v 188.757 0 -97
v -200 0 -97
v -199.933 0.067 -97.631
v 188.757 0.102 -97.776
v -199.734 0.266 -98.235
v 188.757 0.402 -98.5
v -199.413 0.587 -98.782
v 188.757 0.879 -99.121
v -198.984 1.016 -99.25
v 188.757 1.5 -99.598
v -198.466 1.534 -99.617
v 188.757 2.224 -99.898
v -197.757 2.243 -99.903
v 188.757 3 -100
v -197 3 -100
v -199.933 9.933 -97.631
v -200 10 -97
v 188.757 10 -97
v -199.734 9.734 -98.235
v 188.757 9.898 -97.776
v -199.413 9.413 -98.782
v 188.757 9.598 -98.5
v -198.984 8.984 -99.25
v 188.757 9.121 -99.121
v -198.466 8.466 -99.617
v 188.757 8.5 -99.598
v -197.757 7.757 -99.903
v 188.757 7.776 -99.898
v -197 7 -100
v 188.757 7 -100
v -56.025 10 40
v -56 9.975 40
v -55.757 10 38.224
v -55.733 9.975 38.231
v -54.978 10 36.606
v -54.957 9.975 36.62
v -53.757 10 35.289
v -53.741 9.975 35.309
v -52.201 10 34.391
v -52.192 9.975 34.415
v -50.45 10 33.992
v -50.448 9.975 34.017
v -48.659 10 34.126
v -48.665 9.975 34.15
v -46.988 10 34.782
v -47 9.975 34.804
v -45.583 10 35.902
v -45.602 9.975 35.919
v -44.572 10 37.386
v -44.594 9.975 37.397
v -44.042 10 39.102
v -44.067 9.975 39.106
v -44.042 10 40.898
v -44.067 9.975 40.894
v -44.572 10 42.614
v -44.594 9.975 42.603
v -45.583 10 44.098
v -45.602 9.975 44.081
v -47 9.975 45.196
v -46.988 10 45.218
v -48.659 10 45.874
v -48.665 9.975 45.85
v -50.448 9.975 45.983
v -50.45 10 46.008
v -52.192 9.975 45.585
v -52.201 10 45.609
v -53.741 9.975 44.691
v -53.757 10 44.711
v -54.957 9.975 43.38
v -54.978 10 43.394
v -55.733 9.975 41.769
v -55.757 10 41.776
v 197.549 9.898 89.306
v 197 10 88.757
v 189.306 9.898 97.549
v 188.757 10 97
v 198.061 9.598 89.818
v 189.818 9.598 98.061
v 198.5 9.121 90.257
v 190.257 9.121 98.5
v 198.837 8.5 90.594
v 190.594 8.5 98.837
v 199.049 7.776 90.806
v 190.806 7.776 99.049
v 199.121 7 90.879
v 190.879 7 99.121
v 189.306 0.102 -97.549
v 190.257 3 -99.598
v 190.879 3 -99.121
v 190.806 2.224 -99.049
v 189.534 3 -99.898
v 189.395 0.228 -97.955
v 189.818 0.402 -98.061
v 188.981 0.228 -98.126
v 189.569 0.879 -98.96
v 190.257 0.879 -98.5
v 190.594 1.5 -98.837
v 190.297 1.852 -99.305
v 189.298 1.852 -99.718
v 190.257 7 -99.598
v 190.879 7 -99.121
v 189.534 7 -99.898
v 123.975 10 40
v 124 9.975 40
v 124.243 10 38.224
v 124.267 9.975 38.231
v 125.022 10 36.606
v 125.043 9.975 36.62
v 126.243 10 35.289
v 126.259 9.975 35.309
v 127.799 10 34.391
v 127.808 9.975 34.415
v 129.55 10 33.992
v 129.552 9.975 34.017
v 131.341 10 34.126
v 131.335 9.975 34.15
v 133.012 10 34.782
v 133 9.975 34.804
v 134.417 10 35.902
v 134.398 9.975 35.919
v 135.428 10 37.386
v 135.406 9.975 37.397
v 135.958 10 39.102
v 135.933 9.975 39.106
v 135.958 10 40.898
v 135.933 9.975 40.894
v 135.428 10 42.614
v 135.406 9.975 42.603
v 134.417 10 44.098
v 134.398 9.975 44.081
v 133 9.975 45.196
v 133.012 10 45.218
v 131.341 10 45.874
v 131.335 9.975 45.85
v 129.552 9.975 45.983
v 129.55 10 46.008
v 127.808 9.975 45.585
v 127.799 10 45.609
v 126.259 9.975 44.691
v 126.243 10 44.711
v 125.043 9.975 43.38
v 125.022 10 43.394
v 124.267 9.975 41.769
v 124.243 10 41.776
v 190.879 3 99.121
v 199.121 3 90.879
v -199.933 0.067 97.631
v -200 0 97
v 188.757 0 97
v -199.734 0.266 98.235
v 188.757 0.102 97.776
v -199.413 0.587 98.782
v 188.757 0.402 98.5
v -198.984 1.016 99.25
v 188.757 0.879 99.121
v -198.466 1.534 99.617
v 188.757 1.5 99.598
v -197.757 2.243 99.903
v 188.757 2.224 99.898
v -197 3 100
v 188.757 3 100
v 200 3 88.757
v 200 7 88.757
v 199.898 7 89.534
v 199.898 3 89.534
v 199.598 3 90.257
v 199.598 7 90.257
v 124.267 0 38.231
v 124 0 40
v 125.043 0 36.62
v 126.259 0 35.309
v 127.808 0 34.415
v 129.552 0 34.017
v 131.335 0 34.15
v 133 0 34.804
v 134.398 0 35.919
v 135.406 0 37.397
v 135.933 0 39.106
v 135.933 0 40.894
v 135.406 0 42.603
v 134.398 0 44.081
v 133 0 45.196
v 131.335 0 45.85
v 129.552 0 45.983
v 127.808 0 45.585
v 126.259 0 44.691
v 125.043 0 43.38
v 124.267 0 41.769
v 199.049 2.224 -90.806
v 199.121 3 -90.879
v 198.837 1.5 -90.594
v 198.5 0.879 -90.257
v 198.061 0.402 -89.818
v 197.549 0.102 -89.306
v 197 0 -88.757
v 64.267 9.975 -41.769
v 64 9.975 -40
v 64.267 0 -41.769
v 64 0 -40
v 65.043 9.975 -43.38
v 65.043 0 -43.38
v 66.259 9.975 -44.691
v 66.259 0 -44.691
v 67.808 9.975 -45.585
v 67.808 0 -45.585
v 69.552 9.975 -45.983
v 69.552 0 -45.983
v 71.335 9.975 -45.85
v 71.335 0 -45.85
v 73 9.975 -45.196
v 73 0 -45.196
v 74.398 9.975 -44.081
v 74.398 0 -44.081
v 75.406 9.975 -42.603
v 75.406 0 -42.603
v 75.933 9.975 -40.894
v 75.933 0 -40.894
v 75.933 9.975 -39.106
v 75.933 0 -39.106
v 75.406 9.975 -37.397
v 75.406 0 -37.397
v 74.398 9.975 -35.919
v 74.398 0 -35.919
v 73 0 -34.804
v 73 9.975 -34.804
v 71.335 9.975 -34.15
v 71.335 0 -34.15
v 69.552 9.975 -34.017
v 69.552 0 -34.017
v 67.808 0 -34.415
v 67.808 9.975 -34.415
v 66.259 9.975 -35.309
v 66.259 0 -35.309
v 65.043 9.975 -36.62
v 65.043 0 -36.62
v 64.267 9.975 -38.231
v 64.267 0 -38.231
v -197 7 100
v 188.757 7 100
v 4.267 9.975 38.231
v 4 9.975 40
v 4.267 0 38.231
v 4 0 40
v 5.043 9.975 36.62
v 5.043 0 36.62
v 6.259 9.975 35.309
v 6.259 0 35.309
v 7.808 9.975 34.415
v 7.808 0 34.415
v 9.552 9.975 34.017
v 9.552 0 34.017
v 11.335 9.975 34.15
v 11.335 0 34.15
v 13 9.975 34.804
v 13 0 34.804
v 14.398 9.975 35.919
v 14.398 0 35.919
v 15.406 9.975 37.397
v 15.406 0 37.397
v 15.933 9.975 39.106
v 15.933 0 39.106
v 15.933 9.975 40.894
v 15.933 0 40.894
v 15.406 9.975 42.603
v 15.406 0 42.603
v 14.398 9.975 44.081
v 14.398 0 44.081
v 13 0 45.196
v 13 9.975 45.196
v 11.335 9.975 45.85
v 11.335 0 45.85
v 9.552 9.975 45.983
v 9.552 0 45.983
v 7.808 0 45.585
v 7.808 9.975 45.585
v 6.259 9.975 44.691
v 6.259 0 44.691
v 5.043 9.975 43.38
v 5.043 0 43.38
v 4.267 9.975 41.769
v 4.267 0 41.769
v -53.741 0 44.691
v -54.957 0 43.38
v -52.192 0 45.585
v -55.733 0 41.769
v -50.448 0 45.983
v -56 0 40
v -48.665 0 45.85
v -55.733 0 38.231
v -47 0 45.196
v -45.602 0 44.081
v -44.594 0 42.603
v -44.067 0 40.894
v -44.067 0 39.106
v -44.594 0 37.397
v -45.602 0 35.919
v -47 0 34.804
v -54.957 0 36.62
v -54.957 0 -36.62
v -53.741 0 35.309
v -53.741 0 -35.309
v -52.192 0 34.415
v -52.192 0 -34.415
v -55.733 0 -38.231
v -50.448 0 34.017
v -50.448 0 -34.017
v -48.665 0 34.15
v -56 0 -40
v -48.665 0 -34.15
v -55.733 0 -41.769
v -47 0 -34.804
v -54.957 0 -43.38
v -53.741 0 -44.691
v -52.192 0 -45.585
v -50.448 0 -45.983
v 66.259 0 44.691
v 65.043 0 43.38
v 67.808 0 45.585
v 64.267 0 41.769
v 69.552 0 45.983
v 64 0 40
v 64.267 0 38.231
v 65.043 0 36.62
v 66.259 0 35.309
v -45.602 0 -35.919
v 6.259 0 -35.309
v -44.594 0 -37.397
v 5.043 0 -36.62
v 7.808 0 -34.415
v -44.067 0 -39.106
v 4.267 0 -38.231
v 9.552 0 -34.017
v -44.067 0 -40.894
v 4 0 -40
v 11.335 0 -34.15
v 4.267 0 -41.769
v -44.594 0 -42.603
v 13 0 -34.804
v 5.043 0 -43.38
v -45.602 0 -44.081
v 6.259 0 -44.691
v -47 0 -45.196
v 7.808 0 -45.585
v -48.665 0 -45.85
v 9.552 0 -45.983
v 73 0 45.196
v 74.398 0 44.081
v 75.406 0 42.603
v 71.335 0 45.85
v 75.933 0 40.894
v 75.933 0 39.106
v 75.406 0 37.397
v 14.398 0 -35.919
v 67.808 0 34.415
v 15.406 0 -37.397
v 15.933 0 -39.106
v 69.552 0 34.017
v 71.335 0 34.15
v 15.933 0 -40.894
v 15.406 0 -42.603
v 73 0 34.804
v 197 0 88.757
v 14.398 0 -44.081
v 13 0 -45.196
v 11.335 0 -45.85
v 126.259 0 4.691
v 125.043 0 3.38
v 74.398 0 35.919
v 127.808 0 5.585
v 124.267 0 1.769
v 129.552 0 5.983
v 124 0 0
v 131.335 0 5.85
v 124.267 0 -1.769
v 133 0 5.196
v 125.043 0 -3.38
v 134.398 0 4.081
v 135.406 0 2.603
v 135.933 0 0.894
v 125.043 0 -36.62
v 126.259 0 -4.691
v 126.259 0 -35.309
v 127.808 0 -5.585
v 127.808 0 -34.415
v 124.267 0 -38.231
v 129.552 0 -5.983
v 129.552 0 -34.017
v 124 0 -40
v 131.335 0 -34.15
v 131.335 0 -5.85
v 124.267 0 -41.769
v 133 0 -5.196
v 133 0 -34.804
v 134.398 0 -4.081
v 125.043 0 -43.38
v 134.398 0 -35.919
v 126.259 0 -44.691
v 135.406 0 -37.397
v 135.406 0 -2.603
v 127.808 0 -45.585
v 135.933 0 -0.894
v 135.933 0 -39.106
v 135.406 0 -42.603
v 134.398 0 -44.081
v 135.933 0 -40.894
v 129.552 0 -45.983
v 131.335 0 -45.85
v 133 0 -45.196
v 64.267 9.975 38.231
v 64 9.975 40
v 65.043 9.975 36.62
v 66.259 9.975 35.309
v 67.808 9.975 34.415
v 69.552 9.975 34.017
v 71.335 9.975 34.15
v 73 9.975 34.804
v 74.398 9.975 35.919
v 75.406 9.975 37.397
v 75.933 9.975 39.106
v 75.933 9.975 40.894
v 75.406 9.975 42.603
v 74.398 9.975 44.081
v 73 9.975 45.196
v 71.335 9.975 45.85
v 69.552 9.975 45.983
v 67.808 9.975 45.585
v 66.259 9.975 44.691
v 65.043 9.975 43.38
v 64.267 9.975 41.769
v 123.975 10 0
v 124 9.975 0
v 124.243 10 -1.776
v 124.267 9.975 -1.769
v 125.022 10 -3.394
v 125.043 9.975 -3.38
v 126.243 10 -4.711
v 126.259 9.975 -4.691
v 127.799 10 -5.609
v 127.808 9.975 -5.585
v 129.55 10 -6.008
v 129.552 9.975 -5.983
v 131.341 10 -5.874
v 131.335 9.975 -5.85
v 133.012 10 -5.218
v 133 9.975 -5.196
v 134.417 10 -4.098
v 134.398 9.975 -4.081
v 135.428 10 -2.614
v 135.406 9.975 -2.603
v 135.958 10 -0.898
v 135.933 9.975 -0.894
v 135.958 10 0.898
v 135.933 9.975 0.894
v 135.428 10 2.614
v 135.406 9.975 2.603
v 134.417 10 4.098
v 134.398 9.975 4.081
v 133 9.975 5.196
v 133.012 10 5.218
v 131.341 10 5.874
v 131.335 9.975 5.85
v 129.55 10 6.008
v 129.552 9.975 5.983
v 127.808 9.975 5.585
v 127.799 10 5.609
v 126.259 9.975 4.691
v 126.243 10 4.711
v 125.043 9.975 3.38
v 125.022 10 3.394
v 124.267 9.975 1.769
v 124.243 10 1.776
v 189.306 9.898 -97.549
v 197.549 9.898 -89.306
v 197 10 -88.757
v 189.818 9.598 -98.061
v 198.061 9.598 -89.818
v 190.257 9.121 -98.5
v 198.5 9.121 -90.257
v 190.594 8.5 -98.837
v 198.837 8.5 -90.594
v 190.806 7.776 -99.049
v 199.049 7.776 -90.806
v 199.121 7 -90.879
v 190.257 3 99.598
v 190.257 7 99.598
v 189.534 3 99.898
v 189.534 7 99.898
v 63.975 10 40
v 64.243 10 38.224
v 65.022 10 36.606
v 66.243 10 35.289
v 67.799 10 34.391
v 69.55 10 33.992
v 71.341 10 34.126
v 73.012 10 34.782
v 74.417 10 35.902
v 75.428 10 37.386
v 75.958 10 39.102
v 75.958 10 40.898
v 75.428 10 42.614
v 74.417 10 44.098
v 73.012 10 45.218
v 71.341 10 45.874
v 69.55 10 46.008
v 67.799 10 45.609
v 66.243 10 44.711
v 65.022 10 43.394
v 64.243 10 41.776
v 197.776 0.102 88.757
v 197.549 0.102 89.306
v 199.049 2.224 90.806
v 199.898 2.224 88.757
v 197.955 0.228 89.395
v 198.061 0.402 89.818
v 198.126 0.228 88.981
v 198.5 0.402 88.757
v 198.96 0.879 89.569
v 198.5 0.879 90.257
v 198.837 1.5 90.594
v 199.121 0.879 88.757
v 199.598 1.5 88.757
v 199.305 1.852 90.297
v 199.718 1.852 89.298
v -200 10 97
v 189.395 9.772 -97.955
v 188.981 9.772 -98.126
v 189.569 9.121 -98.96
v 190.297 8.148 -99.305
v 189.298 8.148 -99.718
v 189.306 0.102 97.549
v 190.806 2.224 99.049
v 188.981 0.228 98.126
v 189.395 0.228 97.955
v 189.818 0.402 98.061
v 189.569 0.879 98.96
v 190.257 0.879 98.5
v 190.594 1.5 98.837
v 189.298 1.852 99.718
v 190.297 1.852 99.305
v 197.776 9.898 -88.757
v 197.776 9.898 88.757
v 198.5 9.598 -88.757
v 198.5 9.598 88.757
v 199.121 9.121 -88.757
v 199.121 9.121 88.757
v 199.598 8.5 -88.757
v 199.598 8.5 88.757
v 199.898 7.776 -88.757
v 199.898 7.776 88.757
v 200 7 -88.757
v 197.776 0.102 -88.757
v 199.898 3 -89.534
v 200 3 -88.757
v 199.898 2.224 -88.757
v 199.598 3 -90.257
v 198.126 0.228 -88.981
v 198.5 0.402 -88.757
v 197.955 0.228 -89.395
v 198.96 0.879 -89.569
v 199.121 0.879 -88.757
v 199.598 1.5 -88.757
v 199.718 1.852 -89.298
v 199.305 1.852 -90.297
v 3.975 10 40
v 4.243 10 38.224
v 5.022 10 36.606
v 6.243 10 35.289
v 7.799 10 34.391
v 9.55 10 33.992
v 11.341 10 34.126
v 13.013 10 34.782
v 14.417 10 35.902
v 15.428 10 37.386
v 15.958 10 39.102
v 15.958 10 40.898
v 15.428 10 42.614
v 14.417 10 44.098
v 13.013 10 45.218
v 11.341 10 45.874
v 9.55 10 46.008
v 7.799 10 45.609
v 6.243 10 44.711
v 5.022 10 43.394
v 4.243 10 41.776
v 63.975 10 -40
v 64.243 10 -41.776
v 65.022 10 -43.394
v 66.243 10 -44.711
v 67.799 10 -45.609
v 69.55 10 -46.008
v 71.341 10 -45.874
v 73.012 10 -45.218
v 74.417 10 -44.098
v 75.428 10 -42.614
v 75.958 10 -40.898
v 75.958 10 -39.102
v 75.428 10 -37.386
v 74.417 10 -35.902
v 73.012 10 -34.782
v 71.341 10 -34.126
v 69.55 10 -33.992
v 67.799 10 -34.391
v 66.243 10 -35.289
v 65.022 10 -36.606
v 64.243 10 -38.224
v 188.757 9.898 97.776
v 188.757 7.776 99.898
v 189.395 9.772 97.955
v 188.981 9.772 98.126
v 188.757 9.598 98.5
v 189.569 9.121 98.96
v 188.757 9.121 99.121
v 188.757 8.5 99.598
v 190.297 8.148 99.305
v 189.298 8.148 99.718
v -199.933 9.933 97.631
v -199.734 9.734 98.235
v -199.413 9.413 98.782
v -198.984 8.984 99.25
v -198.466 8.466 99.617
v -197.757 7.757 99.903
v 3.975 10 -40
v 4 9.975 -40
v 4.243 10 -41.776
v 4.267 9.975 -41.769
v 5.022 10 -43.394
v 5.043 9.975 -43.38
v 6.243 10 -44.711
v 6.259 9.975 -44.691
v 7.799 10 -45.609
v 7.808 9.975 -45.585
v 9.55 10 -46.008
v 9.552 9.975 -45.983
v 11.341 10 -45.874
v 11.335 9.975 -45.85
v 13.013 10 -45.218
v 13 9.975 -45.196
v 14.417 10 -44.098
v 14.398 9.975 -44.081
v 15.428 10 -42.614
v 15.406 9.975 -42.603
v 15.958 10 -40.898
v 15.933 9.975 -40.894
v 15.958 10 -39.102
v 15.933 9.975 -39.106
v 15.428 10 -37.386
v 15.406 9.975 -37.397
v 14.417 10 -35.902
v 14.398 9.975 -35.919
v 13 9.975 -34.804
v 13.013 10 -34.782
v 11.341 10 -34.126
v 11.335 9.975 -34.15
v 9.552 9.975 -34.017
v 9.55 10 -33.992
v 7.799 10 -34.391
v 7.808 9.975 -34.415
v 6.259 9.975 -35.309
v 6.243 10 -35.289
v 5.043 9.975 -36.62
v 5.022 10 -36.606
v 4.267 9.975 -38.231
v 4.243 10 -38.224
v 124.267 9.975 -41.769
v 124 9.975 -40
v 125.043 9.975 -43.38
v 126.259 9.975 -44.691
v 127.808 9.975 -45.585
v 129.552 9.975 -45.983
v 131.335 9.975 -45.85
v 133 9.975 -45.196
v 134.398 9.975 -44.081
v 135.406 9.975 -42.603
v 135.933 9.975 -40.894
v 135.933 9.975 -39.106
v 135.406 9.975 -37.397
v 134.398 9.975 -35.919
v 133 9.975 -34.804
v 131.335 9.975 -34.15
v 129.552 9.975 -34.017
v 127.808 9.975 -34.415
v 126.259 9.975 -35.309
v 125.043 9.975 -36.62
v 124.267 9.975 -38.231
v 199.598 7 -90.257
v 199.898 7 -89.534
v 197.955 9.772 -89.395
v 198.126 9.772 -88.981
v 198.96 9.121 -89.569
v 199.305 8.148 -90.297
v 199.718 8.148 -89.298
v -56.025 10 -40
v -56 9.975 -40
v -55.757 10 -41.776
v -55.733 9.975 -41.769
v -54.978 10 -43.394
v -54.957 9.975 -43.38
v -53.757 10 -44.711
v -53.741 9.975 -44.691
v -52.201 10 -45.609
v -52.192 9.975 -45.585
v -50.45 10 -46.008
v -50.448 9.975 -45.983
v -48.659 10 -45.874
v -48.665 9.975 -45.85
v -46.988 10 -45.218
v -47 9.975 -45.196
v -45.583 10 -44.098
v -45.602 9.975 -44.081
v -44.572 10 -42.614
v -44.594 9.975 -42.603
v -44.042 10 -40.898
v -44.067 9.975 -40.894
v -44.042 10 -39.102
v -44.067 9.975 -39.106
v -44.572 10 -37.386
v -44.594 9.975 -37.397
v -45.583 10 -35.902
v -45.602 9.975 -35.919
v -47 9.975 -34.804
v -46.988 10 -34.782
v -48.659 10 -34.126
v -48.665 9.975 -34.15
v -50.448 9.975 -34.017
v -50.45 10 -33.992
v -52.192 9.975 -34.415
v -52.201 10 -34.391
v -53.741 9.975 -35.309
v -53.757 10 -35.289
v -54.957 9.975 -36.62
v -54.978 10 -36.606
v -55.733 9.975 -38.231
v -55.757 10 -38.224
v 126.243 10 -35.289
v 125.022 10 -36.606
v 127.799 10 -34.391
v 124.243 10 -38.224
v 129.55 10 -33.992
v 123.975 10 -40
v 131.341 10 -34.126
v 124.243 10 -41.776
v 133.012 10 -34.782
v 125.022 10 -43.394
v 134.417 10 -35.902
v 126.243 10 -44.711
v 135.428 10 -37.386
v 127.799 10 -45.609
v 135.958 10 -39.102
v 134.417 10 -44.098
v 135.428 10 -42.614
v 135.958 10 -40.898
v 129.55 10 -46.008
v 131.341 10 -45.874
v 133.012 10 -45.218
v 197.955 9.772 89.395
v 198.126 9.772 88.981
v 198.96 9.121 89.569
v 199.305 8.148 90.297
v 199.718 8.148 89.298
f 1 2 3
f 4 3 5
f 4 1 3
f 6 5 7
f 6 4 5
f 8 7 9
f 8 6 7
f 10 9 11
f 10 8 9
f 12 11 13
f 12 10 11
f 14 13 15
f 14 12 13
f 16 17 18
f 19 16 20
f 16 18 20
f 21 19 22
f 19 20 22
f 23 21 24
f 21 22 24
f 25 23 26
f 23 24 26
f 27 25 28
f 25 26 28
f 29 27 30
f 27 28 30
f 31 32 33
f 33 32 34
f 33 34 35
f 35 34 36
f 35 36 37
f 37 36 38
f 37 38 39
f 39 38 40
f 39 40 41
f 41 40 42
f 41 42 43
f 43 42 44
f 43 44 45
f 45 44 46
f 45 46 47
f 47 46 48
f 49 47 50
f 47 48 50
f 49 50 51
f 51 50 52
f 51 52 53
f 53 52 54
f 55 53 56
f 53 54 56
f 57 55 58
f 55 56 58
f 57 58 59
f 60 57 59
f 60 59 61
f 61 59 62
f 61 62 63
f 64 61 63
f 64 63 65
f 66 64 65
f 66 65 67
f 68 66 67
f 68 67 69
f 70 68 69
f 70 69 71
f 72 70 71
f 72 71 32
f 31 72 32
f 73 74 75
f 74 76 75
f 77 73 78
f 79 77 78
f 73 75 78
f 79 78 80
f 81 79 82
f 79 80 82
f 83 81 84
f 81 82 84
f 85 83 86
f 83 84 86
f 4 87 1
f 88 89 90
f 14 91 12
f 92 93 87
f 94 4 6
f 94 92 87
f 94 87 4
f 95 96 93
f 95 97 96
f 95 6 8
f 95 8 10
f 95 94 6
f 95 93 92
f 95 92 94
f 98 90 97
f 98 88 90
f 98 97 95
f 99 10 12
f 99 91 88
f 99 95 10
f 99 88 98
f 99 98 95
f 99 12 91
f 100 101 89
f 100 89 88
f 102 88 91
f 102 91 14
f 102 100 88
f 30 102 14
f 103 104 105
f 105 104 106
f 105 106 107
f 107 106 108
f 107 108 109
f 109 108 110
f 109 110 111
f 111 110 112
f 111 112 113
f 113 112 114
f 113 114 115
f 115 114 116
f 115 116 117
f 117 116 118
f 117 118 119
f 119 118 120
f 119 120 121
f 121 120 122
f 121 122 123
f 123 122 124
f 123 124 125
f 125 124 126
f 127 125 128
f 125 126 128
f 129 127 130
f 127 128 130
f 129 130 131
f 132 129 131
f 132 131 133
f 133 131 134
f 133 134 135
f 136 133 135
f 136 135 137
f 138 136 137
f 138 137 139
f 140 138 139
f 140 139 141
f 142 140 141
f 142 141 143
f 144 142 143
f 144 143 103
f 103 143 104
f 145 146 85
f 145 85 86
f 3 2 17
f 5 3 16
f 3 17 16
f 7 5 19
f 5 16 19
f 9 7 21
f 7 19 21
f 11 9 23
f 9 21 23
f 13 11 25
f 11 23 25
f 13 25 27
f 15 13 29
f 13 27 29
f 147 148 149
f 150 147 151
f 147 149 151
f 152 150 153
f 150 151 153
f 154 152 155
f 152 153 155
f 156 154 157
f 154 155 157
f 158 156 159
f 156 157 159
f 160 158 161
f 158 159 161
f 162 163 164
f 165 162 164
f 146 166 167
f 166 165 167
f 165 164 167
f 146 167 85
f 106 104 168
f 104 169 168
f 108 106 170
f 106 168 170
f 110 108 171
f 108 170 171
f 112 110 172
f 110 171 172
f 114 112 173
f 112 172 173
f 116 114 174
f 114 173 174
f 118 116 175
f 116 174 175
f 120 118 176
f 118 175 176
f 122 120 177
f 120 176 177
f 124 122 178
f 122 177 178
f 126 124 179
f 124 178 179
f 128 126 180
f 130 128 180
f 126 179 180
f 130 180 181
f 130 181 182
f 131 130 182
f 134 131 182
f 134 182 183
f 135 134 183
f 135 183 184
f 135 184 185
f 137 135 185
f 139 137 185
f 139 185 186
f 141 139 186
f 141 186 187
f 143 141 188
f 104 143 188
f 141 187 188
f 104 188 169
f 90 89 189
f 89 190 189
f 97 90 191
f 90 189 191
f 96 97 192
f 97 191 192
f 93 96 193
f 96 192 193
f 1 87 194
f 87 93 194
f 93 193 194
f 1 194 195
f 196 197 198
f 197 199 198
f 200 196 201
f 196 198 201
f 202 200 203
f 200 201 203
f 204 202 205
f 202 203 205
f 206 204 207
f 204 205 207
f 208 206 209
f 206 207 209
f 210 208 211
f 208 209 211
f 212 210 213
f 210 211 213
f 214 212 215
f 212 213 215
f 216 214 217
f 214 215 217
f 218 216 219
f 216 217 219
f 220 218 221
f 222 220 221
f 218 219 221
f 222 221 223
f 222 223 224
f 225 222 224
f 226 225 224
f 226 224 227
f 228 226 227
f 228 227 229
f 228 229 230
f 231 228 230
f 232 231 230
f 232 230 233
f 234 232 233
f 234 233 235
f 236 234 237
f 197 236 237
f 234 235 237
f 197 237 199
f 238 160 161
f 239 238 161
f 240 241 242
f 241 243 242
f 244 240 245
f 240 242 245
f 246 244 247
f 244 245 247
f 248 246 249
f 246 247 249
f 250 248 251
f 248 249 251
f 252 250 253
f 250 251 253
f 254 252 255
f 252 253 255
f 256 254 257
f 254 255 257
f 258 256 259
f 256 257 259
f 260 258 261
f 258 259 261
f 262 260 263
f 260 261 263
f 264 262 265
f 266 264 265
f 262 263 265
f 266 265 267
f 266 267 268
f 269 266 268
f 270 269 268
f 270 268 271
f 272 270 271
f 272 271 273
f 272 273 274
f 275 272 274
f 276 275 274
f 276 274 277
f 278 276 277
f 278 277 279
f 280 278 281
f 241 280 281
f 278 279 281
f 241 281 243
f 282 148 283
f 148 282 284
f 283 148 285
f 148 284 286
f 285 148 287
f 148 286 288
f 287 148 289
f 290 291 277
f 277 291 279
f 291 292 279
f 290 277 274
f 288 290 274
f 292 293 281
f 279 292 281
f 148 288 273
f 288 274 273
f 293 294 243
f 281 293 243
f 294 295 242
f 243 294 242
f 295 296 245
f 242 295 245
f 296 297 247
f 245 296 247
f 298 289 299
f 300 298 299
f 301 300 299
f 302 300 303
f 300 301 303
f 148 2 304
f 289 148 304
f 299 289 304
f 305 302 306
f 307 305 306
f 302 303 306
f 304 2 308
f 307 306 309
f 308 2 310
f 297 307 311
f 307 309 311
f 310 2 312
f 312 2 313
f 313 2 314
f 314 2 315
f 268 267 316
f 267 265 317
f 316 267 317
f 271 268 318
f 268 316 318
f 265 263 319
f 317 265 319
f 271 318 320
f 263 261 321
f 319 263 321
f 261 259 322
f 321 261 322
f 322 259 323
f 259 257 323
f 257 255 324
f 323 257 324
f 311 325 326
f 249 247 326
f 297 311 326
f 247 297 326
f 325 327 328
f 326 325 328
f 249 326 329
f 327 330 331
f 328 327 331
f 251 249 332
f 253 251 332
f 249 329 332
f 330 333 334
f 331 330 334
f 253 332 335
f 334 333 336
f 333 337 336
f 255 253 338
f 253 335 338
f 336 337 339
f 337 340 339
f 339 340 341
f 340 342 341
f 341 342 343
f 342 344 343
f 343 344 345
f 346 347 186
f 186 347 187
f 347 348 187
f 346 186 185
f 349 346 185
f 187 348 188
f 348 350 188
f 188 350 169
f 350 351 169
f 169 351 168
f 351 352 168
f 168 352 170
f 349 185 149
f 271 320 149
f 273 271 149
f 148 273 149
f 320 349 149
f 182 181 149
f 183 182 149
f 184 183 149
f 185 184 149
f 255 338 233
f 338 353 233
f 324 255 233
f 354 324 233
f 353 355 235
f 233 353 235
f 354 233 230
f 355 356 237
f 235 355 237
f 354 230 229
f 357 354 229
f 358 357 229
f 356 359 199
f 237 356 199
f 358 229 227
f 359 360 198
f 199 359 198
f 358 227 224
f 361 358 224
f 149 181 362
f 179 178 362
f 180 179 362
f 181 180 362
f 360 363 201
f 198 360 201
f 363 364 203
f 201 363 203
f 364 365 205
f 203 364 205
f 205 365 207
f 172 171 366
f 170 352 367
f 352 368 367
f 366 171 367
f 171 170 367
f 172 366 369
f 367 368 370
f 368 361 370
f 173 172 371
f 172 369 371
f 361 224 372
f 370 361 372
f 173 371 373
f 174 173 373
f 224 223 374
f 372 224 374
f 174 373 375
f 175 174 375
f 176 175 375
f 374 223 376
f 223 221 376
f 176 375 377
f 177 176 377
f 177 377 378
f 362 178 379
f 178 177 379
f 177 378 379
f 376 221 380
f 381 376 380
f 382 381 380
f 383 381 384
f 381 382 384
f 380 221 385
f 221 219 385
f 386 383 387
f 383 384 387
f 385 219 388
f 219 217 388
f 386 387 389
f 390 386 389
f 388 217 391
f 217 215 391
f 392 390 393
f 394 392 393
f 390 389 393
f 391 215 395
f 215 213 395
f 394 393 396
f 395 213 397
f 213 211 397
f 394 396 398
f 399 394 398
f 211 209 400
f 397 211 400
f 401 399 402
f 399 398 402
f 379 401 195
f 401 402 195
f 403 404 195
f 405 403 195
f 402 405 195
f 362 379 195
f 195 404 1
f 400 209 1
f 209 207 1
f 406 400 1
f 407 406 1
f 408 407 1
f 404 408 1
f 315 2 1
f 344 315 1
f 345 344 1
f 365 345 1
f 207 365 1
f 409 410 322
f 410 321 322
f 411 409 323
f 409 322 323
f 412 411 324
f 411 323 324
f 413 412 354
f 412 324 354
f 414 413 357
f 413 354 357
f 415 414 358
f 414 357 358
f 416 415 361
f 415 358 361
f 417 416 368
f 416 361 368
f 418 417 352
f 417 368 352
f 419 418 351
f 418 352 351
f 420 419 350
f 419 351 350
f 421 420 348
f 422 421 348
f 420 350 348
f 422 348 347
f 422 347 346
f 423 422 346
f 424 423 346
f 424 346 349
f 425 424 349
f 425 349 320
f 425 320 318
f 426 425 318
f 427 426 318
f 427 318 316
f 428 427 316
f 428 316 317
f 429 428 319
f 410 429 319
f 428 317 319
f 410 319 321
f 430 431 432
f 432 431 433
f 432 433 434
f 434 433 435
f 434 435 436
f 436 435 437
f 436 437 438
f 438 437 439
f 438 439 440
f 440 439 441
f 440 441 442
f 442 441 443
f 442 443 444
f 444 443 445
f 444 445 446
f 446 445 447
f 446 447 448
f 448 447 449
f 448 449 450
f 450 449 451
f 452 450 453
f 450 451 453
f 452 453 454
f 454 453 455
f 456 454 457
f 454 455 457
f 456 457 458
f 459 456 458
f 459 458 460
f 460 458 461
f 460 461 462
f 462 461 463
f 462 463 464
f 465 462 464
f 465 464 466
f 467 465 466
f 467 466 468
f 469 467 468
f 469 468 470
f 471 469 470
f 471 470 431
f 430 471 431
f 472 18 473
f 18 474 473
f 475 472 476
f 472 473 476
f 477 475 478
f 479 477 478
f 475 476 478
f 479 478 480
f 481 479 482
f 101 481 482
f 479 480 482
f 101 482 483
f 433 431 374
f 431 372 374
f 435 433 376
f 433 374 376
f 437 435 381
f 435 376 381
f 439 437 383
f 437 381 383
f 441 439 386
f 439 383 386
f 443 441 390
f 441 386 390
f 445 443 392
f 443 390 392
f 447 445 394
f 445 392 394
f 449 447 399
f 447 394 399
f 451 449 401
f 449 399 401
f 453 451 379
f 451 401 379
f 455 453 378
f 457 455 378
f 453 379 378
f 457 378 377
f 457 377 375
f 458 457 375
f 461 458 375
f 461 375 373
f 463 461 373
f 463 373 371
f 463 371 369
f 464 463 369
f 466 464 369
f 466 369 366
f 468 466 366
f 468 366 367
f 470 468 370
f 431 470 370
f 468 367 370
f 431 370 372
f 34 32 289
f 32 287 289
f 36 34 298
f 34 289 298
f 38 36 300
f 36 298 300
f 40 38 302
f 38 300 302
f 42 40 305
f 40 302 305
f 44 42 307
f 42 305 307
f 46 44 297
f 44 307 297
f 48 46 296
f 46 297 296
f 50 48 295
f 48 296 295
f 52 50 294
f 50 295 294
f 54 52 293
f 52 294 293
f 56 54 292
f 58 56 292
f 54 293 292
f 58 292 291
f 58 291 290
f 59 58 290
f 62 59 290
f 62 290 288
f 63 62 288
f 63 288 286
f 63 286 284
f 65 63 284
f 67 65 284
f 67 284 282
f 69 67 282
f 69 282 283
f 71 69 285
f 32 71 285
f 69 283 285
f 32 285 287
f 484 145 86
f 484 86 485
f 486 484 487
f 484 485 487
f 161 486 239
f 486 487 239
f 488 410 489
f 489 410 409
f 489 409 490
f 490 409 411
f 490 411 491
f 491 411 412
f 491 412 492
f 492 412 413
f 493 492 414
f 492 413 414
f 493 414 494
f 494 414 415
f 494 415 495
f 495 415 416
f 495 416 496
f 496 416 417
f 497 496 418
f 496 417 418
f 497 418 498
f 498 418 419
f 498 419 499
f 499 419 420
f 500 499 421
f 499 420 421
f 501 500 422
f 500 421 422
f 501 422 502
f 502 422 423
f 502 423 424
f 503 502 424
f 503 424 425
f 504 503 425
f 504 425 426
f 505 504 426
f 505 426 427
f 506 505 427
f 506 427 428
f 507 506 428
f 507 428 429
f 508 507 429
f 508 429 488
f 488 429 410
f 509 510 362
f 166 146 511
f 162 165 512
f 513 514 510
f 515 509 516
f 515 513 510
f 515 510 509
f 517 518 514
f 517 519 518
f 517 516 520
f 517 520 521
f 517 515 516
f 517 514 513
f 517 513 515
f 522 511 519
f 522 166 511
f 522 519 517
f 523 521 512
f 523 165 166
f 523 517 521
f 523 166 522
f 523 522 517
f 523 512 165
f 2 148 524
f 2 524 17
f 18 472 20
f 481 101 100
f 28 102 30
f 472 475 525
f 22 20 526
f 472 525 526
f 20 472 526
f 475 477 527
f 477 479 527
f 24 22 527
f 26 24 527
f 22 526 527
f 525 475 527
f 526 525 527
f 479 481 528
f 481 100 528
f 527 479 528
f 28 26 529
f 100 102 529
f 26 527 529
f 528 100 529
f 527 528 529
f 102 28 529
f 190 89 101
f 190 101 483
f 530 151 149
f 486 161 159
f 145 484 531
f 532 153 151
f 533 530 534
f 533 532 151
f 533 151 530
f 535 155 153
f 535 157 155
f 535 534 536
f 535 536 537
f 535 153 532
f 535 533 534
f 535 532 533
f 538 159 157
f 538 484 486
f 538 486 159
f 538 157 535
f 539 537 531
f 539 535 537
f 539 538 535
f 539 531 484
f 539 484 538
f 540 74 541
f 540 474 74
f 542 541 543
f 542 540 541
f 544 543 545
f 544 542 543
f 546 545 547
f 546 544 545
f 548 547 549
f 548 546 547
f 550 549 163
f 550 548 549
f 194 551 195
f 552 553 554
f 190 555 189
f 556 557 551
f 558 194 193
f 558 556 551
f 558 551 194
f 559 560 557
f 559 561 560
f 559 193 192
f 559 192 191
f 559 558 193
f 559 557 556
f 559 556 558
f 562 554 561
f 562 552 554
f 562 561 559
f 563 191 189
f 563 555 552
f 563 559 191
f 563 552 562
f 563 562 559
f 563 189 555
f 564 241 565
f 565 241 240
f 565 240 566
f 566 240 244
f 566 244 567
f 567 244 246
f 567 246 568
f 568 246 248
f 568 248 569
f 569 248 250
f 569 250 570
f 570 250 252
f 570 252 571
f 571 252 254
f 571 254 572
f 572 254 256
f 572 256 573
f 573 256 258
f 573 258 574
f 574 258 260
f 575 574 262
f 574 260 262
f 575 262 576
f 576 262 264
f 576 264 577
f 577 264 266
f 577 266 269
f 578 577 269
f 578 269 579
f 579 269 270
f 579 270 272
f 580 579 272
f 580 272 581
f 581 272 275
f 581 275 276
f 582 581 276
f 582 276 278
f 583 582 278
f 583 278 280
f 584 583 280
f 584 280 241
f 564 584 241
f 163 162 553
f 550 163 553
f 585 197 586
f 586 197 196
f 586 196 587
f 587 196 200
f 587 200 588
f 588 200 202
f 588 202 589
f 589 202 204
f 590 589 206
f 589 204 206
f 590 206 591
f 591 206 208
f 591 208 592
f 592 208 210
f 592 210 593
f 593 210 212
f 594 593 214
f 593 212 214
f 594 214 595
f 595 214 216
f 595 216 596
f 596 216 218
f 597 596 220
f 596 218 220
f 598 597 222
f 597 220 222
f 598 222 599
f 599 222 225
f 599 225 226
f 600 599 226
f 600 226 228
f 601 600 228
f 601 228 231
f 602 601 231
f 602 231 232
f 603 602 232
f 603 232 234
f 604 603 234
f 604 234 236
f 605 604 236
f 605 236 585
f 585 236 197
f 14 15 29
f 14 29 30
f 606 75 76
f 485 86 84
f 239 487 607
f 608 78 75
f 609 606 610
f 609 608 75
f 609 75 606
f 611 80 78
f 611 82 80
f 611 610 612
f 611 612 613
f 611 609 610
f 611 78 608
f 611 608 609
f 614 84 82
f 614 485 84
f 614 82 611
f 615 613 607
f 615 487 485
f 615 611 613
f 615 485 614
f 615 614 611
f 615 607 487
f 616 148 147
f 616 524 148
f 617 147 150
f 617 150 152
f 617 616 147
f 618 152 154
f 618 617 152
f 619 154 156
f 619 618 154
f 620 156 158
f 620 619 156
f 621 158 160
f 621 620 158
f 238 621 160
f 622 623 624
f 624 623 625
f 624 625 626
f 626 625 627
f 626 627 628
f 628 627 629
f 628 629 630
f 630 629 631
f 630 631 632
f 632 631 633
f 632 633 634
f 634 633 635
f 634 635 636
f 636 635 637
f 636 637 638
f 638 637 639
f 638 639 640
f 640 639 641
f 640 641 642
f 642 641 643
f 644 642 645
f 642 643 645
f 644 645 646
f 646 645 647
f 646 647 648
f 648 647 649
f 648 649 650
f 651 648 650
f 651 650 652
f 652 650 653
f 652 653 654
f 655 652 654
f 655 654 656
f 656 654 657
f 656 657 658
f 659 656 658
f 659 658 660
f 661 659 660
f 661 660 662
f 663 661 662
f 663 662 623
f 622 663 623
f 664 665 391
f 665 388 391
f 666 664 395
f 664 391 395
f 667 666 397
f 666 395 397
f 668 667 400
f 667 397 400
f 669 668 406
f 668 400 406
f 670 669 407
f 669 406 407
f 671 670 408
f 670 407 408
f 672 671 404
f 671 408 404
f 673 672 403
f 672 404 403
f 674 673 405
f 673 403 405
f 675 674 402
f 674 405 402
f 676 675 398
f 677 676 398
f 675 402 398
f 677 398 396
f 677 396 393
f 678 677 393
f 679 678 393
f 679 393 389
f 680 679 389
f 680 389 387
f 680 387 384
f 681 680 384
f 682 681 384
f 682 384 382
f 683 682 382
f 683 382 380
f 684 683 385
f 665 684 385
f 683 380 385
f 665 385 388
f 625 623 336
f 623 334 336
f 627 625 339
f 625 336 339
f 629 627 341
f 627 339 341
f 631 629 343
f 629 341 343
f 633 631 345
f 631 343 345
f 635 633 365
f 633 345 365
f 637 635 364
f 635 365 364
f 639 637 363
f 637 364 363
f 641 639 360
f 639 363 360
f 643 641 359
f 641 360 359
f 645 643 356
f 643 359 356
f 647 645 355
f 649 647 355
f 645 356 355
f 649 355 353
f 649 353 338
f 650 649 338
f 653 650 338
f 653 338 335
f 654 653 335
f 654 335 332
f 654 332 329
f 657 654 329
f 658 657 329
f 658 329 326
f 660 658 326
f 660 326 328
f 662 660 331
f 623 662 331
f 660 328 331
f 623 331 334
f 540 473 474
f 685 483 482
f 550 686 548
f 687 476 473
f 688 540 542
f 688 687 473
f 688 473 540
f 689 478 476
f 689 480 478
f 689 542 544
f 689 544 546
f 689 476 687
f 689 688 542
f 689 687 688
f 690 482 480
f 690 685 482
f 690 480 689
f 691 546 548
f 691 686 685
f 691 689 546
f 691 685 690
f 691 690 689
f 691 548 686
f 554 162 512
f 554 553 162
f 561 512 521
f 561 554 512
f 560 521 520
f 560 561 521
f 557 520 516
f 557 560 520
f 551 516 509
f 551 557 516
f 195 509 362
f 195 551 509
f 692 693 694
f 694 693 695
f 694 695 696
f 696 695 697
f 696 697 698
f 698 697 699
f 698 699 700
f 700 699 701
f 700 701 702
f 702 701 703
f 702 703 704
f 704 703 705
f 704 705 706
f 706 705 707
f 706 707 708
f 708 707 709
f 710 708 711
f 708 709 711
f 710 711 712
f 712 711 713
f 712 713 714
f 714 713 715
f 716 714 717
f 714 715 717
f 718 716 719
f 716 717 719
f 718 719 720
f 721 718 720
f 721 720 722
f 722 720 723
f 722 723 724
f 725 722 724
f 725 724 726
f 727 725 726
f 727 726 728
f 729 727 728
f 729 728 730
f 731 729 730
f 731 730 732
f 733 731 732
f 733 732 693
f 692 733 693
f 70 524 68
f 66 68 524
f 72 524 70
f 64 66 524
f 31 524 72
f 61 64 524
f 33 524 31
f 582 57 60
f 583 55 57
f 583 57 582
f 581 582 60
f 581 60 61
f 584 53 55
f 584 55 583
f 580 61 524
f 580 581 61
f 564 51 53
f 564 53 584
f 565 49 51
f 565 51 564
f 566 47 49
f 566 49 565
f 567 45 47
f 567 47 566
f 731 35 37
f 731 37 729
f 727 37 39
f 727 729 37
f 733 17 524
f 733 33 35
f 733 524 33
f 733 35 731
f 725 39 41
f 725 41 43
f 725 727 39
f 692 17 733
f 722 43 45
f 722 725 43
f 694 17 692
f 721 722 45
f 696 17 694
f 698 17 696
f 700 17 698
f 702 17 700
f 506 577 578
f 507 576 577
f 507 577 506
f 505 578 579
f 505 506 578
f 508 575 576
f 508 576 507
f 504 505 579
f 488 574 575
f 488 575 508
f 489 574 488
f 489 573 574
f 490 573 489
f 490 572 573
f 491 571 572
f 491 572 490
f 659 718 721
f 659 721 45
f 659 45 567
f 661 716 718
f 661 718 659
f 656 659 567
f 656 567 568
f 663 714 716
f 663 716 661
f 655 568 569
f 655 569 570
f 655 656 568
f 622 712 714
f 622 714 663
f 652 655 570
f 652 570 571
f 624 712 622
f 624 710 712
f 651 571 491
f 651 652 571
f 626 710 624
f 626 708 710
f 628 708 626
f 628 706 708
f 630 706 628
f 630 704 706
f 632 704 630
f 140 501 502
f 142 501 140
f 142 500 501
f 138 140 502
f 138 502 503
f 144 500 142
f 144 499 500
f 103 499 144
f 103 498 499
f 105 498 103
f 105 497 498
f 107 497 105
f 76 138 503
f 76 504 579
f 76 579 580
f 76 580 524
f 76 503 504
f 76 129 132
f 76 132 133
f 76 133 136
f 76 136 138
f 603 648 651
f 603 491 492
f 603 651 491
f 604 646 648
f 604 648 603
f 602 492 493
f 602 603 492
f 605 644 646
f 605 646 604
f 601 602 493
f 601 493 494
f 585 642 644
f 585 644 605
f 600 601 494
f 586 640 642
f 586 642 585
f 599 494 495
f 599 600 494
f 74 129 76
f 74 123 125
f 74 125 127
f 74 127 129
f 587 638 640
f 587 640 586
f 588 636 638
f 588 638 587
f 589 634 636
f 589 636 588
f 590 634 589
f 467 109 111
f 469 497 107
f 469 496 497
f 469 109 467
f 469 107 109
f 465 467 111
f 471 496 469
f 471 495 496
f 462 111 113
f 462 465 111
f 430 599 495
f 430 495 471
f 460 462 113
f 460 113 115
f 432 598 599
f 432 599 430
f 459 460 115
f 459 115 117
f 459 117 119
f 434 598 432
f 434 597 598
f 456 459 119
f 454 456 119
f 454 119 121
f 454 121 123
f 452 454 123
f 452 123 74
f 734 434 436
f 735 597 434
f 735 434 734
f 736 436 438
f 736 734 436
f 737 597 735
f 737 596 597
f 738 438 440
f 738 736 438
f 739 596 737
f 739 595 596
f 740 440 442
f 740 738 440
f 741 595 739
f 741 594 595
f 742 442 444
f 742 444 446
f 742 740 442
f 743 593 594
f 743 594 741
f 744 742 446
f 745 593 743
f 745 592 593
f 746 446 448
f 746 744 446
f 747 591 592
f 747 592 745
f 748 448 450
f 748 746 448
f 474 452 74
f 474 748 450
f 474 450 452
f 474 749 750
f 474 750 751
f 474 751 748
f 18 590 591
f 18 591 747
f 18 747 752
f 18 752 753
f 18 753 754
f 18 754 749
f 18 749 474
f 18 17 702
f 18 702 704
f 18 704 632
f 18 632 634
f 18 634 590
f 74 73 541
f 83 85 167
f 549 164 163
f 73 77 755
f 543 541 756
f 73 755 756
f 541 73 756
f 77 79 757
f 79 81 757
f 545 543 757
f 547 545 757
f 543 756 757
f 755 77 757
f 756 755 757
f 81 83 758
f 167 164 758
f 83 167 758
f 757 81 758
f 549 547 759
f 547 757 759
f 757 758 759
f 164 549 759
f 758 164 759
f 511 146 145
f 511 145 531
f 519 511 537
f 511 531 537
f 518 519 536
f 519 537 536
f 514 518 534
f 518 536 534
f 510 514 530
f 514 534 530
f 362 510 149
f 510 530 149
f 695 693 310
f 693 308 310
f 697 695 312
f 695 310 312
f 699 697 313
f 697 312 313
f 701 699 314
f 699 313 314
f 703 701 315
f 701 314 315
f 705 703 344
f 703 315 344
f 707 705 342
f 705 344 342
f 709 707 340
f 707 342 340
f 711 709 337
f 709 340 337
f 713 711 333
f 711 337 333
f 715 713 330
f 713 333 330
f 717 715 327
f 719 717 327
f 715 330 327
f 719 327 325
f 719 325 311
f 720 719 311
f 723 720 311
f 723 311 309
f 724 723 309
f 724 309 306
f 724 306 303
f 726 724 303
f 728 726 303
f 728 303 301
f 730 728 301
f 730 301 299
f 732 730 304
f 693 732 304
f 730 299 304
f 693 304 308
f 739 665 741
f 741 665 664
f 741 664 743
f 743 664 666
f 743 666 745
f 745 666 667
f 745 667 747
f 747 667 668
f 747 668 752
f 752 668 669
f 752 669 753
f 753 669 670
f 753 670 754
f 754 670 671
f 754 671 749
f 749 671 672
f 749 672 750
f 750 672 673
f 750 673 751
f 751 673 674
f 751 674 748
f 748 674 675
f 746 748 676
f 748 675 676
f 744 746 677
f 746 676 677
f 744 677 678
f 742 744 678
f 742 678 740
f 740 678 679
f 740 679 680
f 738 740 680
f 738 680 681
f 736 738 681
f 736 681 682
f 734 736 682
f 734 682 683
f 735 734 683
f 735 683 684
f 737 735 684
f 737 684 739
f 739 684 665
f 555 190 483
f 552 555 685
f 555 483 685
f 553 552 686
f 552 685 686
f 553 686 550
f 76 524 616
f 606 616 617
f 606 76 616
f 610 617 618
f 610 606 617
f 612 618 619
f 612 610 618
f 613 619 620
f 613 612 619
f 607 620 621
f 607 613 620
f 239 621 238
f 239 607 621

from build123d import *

# Parameters (mm, degrees)
SKETCH1_W                       = 400
SKETCH1_H                       = 200
BASE_FLANGE1_DEPTH              = 10
BREAK_CORNER1_DEPTH             = 10
M10_CLEARANCE_HOLE1_D           = 12
M10_CLEARANCE_HOLE1_CSINK_D     = 12.05
M10_CLEARANCE_HOLE1_CSINK_ANGLE = 90
FILLET1_R                       = 3


# Read off the part's stored shape, not the designer's step: Break-Corner1
# Sheet-metal steps are written as plain solids
with BuildPart() as part:
    # Sketch1 → Base-Flange1 (new body)
    with BuildSketch(Plane(origin=(0, 0, 0), x_dir=(1, 0, 0), z_dir=(0, 1, 0))):
        Rectangle(SKETCH1_W, SKETCH1_H)
    extrude(amount=BASE_FLANGE1_DEPTH)

    # Break-Corner1 outline → Break-Corner1 (cut)
    with BuildSketch(Plane(origin=(0, 0, 0), x_dir=(1, 0, 0), z_dir=(0, 1, 0))):
        Polygon((200, -100), (200, -90), (190, -100), align=None)
        Polygon((190, 100), (200, 90), (200, 100), align=None)
    extrude(amount=BREAK_CORNER1_DEPTH, mode=Mode.SUBTRACT)

    # M10 Clearance Hole1 (through all)
    with Locations(Plane(origin=(0, 10, 0), x_dir=(1, 0, 0), z_dir=(0, 1, 0))):
        with Locations((-50, 40), (10, 40), (70, 40), (130, 40), (130, 0), (130, -40), (70, -40), (10, -40), (-50, -40)):
            CounterSinkHole(M10_CLEARANCE_HOLE1_D / 2, M10_CLEARANCE_HOLE1_CSINK_D / 2, counter_sink_angle=M10_CLEARANCE_HOLE1_CSINK_ANGLE)

    # Fillet1
    fillet1_edges = [part.edges().sort_by_distance(p)[0] for p in [
        (200, 0, 0),
        (200, 10, 0),
        (200, 5, 90),
        (195, 0, 95),
        (190, 5, 100),
        (195, 10, 95),
        (-5, 0, -100),
        (-5, 10, -100),
        (190, 5, -100),
        (195, 0, -95),
        (200, 5, -90),
        (195, 10, -95),
        (-5, 0, 100),
        (-200, 5, -100),
        (-200, 5, 100),
        (-5, 10, 100),
    ]]
    fillet(fillet1_edges, radius=FILLET1_R)


solid = part.part
